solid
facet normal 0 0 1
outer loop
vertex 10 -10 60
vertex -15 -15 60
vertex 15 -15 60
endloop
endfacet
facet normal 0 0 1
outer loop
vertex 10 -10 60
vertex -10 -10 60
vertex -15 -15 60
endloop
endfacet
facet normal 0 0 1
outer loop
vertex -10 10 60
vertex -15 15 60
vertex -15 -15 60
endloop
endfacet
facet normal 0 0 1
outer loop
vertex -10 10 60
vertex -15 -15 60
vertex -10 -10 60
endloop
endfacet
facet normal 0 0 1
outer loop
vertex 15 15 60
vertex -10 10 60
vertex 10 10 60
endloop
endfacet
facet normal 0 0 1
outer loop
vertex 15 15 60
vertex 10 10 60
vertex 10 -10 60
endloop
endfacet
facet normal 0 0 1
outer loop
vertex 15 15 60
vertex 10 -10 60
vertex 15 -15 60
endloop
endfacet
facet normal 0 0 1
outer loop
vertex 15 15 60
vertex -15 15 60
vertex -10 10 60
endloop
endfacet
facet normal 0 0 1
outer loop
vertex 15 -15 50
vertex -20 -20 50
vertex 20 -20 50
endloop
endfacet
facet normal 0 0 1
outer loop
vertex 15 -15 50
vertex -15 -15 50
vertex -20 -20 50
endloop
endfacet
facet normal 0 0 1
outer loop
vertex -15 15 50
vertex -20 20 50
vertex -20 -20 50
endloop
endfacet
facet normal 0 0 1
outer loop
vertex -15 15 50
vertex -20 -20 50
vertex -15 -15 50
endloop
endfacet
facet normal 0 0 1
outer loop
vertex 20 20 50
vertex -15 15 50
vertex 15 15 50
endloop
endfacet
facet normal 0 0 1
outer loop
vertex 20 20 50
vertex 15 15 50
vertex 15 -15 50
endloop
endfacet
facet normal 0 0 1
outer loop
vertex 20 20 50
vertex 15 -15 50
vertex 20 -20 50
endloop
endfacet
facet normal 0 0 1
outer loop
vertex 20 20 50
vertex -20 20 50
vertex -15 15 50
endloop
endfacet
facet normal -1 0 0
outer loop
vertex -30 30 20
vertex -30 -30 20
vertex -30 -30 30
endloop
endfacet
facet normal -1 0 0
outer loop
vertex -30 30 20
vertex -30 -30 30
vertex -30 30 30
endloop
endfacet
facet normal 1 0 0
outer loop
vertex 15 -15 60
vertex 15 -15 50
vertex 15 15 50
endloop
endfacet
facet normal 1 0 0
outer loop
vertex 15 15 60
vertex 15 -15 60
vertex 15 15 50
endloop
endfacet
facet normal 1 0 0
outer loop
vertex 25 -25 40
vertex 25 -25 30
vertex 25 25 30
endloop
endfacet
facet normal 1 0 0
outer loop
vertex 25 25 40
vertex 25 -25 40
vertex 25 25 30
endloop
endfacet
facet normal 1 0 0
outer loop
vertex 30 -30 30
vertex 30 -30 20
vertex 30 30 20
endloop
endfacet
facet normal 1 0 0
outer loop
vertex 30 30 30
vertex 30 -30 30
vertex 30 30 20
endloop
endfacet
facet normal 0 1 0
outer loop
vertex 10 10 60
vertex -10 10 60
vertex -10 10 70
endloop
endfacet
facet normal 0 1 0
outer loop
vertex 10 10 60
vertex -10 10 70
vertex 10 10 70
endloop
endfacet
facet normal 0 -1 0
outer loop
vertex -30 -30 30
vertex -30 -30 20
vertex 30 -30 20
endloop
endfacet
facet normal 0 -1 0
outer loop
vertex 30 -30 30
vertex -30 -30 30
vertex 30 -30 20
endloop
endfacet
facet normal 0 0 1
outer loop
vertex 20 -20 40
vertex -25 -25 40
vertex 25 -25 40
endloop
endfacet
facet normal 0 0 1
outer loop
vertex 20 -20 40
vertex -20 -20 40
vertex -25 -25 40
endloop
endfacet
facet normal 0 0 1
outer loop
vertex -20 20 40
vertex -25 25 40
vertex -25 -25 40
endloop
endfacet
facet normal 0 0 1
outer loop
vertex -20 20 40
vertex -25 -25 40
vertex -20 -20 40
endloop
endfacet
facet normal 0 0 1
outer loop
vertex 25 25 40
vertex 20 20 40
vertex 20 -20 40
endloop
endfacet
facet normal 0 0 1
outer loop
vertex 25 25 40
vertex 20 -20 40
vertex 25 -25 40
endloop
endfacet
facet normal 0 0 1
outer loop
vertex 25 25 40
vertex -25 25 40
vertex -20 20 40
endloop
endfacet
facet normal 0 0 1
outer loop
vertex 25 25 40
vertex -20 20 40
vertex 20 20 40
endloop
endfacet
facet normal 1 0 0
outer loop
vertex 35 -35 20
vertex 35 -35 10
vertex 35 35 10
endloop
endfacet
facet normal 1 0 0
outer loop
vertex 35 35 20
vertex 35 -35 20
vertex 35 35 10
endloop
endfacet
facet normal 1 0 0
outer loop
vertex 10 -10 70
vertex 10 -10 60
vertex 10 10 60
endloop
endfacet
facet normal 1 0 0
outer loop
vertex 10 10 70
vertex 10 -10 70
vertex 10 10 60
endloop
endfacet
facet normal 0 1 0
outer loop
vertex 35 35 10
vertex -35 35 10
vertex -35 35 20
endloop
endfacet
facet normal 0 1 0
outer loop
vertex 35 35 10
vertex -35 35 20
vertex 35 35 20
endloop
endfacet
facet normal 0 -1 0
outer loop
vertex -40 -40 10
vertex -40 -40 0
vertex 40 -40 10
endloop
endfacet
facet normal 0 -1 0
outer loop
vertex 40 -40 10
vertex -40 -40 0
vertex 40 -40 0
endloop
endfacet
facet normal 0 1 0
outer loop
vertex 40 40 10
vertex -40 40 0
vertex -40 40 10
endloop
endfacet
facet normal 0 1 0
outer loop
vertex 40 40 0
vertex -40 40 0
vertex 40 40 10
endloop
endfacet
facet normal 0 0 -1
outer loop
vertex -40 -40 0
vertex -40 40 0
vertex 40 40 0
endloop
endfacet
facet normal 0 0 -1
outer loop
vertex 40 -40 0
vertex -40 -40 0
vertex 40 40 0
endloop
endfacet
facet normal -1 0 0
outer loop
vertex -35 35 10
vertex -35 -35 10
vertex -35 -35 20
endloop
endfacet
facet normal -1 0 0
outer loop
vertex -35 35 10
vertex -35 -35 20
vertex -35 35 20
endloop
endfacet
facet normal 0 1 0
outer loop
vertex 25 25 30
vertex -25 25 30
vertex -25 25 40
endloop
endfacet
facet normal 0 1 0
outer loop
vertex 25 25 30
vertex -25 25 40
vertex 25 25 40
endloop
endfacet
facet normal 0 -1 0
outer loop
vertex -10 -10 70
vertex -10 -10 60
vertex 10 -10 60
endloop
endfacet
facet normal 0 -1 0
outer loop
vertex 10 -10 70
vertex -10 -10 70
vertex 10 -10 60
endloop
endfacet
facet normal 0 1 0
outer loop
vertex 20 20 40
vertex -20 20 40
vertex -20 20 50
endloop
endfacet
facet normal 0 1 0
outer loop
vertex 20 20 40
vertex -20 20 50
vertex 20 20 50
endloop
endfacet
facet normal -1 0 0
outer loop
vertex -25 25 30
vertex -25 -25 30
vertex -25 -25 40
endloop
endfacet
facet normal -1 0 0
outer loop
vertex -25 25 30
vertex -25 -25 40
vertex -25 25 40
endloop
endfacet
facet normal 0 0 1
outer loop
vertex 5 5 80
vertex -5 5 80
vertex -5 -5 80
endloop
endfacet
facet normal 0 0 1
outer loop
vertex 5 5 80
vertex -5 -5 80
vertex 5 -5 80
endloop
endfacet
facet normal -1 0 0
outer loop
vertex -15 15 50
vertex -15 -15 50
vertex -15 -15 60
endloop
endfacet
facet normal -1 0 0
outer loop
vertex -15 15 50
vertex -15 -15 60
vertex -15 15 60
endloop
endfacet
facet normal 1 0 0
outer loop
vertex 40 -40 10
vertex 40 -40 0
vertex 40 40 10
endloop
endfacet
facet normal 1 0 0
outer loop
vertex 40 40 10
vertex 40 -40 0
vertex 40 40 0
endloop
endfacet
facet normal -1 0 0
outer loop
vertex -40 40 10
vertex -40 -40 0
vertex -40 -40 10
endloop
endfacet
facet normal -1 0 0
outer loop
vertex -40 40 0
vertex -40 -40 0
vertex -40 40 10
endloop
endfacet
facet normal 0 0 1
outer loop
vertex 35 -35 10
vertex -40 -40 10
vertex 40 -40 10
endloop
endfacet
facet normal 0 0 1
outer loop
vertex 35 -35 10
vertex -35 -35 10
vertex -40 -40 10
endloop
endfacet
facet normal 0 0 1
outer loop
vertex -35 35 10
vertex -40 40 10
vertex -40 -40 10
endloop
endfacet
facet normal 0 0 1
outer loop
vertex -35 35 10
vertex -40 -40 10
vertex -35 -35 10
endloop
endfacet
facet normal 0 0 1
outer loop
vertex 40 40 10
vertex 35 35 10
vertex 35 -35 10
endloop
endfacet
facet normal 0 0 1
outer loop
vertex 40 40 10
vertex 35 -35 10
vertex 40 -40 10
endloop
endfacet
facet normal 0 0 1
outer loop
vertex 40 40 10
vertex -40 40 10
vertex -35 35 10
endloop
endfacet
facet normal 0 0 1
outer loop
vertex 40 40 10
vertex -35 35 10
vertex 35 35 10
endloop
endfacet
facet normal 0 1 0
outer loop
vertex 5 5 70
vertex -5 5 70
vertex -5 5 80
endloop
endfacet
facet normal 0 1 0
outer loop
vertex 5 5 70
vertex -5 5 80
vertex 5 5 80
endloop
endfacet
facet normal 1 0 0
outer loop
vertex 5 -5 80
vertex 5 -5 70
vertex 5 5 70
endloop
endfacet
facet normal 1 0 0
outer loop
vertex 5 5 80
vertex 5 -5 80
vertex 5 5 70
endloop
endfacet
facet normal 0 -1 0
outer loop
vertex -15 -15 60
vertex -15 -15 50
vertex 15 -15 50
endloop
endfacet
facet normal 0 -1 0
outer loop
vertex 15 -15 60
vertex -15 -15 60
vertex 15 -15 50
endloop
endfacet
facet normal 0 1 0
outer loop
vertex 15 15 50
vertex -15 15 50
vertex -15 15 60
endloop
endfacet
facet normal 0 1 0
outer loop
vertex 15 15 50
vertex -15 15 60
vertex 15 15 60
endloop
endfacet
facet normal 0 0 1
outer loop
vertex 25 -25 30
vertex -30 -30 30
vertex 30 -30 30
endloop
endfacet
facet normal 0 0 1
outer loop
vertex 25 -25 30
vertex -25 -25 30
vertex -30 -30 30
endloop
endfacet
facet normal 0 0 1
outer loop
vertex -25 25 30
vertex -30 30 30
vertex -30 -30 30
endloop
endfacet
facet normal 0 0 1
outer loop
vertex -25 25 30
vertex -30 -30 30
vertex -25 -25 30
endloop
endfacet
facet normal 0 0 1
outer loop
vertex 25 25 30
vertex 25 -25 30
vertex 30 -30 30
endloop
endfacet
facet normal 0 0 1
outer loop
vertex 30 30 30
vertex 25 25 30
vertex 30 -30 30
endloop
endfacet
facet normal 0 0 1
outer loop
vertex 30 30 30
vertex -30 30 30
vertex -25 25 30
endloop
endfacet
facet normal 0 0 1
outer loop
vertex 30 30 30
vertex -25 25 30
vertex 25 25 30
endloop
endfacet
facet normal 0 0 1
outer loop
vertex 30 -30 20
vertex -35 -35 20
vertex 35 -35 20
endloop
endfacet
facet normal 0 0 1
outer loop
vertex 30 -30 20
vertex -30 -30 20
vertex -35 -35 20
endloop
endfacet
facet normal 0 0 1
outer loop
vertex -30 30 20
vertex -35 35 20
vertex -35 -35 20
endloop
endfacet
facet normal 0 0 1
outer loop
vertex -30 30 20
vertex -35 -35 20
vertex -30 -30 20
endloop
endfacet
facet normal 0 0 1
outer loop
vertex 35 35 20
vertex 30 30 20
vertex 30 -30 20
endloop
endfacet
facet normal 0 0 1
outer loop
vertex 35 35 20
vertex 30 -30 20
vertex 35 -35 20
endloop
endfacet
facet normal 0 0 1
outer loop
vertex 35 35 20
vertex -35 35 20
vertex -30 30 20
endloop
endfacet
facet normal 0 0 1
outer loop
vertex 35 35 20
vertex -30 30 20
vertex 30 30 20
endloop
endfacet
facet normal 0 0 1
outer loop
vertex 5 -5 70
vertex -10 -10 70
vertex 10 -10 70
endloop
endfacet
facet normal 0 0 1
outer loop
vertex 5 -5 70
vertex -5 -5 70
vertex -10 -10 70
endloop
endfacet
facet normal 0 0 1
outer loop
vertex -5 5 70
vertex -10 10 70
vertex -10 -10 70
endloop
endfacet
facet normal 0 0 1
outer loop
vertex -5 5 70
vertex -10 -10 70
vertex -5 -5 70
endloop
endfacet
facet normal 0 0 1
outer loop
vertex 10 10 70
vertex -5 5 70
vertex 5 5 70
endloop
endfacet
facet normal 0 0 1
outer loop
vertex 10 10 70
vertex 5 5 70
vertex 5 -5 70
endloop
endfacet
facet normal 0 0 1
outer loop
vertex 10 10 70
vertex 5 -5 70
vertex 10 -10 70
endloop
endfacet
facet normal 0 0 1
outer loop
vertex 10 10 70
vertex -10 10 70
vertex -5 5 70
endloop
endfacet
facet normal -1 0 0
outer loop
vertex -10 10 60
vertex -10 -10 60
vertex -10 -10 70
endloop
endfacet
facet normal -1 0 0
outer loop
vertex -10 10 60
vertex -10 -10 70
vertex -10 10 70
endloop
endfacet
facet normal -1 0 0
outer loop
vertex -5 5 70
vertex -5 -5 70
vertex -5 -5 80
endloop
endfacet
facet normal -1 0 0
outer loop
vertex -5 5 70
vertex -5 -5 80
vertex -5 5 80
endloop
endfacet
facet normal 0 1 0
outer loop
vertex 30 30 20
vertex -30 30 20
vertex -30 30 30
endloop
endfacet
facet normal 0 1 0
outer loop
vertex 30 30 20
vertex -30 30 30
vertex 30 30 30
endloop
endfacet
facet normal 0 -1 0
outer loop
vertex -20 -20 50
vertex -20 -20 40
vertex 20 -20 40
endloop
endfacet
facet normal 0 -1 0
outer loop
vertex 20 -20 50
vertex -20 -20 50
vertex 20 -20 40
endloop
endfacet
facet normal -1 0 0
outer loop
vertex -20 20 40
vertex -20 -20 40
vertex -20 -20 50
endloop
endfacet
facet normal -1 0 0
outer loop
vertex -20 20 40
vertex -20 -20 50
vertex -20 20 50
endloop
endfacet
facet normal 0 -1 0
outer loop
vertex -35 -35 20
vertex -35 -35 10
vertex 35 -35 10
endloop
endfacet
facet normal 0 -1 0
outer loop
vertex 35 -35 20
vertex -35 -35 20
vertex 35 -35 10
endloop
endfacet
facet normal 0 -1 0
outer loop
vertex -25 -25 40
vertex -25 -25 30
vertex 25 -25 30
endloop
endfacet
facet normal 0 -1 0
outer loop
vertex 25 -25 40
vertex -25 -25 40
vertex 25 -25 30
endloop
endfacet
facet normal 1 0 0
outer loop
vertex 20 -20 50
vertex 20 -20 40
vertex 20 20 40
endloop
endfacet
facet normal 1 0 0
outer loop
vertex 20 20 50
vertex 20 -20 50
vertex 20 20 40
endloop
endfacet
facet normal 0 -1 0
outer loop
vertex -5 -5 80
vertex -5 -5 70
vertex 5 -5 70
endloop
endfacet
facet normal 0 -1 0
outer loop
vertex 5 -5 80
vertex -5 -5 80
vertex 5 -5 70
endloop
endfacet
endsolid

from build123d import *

# Parameters (mm, degrees)
F0_W     = 80
F0_H     = 80
F0_W_2   = 70
F0_H_2   = 70
F1_DEPTH = 10
F0_W_3   = 60
F0_H_3   = 60
F2_DEPTH = 20
F0_W_4   = 50
F0_H_4   = 50
F3_DEPTH = 30
F0_W_5   = 40
F0_H_5   = 40
F4_DEPTH = 40
F0_W_6   = 30
F0_H_6   = 30
F5_DEPTH = 50
F0_W_7   = 20
F0_H_7   = 20
F6_DEPTH = 60
F0_W_8   = 10
F0_H_8   = 10
F7_DEPTH = 70
F8_DEPTH = 80


with BuildPart() as f1:
    # F0 (on Top) → F1 (new body)
    with BuildSketch(Plane.XY):
        Rectangle(F0_W, F0_H)
        Rectangle(F0_W_2, F0_H_2, mode=Mode.SUBTRACT)
    extrude(amount=F1_DEPTH)

    # F0 (on Top) → F2 (join)
    with BuildSketch(Plane.XY):
        Rectangle(F0_W_2, F0_H_2)
        Rectangle(F0_W_3, F0_H_3, mode=Mode.SUBTRACT)
    extrude(amount=F2_DEPTH)

    # F0 (on Top) → F3 (join)
    with BuildSketch(Plane.XY):
        Rectangle(F0_W_3, F0_H_3)
        Rectangle(F0_W_4, F0_H_4, mode=Mode.SUBTRACT)
    extrude(amount=F3_DEPTH)

    # F0 (on Top) → F4 (join)
    with BuildSketch(Plane.XY):
        Rectangle(F0_W_4, F0_H_4)
        Rectangle(F0_W_5, F0_H_5, mode=Mode.SUBTRACT)
    extrude(amount=F4_DEPTH)

    # F0 (on Top) → F5 (join)
    with BuildSketch(Plane.XY):
        Rectangle(F0_W_5, F0_H_5)
        Rectangle(F0_W_6, F0_H_6, mode=Mode.SUBTRACT)
    extrude(amount=F5_DEPTH)

    # F0 (on Top) → F6 (join)
    with BuildSketch(Plane.XY):
        Rectangle(F0_W_6, F0_H_6)
        Rectangle(F0_W_7, F0_H_7, mode=Mode.SUBTRACT)
    extrude(amount=F6_DEPTH)

    # F0 (on Top) → F7 (join)
    with BuildSketch(Plane.XY):
        Rectangle(F0_W_7, F0_H_7)
        Rectangle(F0_W_8, F0_H_8, mode=Mode.SUBTRACT)
    extrude(amount=F7_DEPTH)

    # F0 (on Top) → F8 (join)
    with BuildSketch(Plane.XY):
        Rectangle(F0_W_8, F0_H_8)
    extrude(amount=F8_DEPTH)


solid = f1.part
